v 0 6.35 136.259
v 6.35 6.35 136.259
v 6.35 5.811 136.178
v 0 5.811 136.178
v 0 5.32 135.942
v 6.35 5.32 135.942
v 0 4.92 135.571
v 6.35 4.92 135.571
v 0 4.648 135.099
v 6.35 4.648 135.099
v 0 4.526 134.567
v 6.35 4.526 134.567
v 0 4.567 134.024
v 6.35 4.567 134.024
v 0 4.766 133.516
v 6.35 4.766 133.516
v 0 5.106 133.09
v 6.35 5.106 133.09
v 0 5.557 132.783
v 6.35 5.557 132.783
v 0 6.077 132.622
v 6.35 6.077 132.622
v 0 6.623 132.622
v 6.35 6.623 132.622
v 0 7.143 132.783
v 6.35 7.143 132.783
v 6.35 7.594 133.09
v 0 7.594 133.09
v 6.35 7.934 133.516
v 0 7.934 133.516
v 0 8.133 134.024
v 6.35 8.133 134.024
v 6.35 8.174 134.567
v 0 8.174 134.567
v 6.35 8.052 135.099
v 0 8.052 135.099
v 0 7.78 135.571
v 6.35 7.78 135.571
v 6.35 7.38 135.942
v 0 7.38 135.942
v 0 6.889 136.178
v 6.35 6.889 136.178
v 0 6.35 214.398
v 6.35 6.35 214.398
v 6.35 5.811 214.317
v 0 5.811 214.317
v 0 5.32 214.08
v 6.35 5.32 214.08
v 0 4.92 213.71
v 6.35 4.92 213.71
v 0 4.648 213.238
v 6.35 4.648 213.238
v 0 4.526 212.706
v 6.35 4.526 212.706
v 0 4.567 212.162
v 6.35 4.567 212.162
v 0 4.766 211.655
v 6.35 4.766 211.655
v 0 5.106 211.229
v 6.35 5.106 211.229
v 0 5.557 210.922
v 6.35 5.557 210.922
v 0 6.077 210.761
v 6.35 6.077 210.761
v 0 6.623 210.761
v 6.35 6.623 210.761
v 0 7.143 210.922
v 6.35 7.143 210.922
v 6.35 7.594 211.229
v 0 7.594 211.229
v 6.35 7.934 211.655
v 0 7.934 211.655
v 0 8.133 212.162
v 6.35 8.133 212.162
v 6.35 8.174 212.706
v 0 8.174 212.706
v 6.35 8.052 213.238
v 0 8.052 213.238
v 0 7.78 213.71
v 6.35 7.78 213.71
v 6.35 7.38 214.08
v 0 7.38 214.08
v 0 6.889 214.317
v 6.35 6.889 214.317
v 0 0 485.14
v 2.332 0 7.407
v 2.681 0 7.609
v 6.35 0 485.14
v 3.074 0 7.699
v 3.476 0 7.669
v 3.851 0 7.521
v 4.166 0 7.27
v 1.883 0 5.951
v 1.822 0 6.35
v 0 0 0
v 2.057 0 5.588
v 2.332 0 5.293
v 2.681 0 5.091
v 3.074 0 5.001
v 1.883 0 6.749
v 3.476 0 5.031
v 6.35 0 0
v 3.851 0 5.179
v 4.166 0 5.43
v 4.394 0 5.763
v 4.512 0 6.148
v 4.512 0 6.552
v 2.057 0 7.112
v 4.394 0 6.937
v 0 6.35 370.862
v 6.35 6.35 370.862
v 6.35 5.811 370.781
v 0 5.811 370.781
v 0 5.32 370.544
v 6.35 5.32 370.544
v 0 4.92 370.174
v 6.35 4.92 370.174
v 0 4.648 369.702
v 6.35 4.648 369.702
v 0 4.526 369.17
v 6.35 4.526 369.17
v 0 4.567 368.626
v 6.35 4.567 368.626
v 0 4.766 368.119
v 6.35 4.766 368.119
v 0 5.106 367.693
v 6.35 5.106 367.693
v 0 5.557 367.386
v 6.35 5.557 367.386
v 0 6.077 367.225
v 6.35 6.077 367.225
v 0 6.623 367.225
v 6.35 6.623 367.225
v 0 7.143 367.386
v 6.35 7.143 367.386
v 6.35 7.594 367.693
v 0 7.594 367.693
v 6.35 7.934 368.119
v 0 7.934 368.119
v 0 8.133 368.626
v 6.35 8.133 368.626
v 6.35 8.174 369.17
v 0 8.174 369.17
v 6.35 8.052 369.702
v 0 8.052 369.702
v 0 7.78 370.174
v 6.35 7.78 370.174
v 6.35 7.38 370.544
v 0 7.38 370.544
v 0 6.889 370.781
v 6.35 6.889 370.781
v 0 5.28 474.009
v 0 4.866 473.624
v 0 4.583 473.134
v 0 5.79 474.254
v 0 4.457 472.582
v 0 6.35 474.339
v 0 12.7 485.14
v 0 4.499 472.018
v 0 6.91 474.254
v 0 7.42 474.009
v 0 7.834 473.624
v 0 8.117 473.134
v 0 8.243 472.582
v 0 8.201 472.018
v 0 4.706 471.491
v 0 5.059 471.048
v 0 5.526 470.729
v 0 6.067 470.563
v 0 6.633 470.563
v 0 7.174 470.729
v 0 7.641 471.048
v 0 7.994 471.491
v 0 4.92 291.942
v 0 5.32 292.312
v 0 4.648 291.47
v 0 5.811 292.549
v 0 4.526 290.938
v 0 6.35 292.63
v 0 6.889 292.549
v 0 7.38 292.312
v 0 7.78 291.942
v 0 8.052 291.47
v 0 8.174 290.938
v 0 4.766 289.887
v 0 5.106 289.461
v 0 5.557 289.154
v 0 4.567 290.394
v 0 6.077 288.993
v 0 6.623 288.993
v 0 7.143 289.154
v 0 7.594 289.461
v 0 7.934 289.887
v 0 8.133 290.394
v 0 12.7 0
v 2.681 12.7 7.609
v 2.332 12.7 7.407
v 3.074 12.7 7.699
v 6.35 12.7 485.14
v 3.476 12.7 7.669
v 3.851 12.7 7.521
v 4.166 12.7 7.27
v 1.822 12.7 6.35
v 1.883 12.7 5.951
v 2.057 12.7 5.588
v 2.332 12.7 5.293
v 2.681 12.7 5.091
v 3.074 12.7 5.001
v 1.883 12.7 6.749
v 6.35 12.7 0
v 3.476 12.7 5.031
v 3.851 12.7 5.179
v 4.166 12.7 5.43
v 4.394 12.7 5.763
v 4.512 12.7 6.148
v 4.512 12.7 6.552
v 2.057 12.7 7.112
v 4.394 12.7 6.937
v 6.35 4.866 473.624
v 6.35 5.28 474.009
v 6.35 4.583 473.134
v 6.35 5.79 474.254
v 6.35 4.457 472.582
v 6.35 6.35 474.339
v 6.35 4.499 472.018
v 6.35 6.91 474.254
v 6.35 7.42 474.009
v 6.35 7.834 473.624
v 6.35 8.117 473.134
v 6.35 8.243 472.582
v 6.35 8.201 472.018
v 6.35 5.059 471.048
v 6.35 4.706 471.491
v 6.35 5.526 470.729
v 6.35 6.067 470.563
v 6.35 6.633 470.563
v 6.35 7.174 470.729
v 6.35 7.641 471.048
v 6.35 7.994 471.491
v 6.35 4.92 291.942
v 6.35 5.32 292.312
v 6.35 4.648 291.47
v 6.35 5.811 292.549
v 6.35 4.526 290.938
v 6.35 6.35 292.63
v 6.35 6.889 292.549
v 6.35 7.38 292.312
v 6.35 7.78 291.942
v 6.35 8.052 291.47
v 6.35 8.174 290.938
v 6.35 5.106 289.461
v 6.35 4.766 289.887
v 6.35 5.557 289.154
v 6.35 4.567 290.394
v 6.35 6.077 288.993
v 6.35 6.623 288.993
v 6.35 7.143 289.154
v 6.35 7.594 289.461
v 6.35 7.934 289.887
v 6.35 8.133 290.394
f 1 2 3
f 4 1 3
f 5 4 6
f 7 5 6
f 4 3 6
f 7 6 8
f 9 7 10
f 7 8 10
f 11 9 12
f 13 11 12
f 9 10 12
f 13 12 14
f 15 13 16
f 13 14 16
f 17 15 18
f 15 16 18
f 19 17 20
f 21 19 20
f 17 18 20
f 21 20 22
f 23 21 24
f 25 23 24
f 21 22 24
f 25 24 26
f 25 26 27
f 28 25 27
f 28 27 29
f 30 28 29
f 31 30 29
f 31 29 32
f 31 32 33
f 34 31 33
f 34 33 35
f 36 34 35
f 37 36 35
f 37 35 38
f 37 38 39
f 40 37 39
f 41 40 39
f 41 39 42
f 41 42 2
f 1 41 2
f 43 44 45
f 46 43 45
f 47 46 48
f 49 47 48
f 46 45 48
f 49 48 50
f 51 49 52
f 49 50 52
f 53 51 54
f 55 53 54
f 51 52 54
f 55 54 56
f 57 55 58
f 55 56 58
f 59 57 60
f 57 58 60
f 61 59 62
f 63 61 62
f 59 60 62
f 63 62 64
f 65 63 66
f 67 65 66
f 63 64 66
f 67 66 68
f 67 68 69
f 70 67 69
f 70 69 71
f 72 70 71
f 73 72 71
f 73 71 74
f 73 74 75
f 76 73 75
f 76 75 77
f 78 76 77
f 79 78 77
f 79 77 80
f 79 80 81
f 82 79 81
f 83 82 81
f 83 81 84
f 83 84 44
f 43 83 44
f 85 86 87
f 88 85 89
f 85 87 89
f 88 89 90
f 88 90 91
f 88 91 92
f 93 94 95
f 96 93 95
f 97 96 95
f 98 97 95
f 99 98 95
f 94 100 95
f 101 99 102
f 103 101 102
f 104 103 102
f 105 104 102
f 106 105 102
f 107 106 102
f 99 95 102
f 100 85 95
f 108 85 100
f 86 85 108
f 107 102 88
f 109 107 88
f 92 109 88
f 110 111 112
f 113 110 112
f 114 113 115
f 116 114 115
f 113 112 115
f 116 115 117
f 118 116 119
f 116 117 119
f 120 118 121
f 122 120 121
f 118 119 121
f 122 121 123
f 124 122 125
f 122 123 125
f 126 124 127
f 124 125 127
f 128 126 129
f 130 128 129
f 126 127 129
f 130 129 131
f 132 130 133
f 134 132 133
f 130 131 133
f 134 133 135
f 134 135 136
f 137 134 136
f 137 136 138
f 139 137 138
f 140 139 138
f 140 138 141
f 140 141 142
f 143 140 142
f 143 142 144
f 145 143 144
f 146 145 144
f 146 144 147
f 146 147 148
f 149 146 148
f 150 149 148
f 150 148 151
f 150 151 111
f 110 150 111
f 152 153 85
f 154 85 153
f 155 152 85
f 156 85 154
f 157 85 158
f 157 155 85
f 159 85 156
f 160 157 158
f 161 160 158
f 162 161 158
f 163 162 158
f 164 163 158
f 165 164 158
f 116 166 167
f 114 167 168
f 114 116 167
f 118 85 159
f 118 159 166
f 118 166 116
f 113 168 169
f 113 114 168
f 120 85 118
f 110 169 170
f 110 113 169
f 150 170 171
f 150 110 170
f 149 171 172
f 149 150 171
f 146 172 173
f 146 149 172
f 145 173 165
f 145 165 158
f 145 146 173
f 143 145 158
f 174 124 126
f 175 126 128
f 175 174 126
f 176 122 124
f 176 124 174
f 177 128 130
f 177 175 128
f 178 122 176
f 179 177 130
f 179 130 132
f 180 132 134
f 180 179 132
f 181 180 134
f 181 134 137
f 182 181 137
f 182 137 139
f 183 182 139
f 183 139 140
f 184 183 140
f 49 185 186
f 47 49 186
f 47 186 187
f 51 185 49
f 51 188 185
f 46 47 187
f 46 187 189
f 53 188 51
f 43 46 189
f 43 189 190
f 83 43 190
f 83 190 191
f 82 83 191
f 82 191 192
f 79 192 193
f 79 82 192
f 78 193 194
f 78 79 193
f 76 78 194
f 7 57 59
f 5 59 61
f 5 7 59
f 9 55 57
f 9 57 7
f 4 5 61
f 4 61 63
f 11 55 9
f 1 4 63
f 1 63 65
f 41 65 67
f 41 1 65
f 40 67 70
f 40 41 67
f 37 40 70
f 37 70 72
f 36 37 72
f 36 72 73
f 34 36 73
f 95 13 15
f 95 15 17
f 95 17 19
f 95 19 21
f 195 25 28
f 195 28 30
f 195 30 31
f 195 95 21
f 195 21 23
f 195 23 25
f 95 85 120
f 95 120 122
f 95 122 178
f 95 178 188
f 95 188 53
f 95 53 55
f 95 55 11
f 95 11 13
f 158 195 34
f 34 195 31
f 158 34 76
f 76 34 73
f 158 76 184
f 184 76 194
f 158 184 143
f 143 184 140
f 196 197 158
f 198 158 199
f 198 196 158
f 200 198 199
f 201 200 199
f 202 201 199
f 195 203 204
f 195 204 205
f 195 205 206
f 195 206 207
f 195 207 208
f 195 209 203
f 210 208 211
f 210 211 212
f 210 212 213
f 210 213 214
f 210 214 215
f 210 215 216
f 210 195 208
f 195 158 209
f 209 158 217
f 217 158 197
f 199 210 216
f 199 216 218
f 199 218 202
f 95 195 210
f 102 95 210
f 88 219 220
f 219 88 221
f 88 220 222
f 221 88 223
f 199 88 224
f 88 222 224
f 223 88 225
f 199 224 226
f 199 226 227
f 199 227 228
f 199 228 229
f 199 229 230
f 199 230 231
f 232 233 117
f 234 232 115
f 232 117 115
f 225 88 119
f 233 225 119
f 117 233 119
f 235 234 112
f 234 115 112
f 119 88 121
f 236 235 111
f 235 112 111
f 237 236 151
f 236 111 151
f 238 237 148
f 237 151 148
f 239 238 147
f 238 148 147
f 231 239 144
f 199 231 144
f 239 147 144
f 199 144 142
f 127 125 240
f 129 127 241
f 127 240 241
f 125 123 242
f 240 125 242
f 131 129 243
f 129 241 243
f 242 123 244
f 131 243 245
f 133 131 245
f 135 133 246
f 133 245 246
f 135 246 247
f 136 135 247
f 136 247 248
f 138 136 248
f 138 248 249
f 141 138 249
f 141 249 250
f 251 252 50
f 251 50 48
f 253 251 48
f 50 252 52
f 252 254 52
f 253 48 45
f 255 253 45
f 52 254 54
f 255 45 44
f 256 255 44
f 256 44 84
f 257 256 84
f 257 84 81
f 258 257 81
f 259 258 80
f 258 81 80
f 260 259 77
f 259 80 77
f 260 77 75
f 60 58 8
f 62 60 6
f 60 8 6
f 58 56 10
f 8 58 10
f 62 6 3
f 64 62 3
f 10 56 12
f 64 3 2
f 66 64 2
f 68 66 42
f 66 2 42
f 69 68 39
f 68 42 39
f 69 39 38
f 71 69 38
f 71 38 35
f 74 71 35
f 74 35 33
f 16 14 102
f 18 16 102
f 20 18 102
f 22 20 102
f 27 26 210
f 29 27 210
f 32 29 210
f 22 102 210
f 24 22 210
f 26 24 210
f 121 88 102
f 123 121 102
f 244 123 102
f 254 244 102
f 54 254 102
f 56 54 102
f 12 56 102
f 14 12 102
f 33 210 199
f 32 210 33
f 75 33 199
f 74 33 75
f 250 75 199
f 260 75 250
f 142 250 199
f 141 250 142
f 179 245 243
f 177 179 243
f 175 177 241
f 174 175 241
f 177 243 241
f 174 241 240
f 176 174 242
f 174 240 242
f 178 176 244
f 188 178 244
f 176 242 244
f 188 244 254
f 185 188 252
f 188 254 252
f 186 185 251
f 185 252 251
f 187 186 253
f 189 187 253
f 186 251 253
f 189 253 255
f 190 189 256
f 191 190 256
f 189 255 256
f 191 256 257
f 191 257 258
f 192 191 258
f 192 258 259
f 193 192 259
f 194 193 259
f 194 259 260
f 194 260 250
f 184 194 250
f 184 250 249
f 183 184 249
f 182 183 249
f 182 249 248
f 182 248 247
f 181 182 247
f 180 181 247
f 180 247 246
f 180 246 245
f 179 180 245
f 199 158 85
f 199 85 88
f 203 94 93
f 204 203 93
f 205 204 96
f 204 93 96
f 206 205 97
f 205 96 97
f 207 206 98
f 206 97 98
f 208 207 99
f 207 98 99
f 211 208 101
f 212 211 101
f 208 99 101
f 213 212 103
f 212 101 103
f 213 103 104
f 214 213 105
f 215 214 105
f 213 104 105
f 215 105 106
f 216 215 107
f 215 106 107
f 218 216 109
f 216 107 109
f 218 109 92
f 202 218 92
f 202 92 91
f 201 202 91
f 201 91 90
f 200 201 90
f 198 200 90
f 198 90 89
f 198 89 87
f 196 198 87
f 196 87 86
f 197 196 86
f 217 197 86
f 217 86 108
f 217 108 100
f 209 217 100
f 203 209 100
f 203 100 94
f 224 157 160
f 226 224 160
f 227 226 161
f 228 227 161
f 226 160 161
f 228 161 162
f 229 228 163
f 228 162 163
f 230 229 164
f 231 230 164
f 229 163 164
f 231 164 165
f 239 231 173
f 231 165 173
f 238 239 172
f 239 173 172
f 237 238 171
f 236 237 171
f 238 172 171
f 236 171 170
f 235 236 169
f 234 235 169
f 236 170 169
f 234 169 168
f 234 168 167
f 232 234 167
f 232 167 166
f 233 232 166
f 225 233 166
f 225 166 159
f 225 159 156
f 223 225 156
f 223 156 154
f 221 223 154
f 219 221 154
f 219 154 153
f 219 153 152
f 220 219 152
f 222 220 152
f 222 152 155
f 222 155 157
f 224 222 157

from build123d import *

# Parameters (mm, degrees)
SKETCH1_W                 = 6.35
SKETCH1_H                 = 12.7
BOSS_EXTRUDE1_DEPTH       = 485.14
F_6_CLEARANCE_HOLE1_D     = 3.7973
TAP_DRILL_FOR_6_32_TAP1_D = 2.7051
F_6_CLEARANCE_HOLE2_D     = 3.6576


with BuildPart() as part:
    # Sketch1 → Boss-Extrude1 (new body)
    with BuildSketch(Plane.XY):
        with Locations((3.175, 6.35)):
            Rectangle(SKETCH1_W, SKETCH1_H)
    extrude(amount=BOSS_EXTRUDE1_DEPTH)

    # #6 Clearance Hole1 (through all)
    with Locations(Plane(origin=(6.35, 0, 0), x_dir=(0, 0, -1), z_dir=(1, 0, 0))):
        with Locations((-472.44, 6.35)):
            Hole(F_6_CLEARANCE_HOLE1_D / 2)

    # Tap Drill for #6-32 Tap1 (through all)
    with Locations(Plane(origin=(0, 12.7, 0), x_dir=(1, 0, 0), z_dir=(0, 1, 0))):
        with Locations((3.175, -6.35)):
            Hole(TAP_DRILL_FOR_6_32_TAP1_D / 2)

    # #6 Clearance Hole2 (through all)
    with Locations(Plane(origin=(0, 1342.118435602, -1739.809386822), x_dir=(0, 0, -1), z_dir=(-1, 0, 0))):
        with Locations((-2108.842826276, 1335.768435602), (-1952.378826276, 1335.768435602), (-2030.610826276, 1335.768435602), (-1874.240025135, 1335.768435602)):
            Hole(F_6_CLEARANCE_HOLE2_D / 2)


solid = part.part
